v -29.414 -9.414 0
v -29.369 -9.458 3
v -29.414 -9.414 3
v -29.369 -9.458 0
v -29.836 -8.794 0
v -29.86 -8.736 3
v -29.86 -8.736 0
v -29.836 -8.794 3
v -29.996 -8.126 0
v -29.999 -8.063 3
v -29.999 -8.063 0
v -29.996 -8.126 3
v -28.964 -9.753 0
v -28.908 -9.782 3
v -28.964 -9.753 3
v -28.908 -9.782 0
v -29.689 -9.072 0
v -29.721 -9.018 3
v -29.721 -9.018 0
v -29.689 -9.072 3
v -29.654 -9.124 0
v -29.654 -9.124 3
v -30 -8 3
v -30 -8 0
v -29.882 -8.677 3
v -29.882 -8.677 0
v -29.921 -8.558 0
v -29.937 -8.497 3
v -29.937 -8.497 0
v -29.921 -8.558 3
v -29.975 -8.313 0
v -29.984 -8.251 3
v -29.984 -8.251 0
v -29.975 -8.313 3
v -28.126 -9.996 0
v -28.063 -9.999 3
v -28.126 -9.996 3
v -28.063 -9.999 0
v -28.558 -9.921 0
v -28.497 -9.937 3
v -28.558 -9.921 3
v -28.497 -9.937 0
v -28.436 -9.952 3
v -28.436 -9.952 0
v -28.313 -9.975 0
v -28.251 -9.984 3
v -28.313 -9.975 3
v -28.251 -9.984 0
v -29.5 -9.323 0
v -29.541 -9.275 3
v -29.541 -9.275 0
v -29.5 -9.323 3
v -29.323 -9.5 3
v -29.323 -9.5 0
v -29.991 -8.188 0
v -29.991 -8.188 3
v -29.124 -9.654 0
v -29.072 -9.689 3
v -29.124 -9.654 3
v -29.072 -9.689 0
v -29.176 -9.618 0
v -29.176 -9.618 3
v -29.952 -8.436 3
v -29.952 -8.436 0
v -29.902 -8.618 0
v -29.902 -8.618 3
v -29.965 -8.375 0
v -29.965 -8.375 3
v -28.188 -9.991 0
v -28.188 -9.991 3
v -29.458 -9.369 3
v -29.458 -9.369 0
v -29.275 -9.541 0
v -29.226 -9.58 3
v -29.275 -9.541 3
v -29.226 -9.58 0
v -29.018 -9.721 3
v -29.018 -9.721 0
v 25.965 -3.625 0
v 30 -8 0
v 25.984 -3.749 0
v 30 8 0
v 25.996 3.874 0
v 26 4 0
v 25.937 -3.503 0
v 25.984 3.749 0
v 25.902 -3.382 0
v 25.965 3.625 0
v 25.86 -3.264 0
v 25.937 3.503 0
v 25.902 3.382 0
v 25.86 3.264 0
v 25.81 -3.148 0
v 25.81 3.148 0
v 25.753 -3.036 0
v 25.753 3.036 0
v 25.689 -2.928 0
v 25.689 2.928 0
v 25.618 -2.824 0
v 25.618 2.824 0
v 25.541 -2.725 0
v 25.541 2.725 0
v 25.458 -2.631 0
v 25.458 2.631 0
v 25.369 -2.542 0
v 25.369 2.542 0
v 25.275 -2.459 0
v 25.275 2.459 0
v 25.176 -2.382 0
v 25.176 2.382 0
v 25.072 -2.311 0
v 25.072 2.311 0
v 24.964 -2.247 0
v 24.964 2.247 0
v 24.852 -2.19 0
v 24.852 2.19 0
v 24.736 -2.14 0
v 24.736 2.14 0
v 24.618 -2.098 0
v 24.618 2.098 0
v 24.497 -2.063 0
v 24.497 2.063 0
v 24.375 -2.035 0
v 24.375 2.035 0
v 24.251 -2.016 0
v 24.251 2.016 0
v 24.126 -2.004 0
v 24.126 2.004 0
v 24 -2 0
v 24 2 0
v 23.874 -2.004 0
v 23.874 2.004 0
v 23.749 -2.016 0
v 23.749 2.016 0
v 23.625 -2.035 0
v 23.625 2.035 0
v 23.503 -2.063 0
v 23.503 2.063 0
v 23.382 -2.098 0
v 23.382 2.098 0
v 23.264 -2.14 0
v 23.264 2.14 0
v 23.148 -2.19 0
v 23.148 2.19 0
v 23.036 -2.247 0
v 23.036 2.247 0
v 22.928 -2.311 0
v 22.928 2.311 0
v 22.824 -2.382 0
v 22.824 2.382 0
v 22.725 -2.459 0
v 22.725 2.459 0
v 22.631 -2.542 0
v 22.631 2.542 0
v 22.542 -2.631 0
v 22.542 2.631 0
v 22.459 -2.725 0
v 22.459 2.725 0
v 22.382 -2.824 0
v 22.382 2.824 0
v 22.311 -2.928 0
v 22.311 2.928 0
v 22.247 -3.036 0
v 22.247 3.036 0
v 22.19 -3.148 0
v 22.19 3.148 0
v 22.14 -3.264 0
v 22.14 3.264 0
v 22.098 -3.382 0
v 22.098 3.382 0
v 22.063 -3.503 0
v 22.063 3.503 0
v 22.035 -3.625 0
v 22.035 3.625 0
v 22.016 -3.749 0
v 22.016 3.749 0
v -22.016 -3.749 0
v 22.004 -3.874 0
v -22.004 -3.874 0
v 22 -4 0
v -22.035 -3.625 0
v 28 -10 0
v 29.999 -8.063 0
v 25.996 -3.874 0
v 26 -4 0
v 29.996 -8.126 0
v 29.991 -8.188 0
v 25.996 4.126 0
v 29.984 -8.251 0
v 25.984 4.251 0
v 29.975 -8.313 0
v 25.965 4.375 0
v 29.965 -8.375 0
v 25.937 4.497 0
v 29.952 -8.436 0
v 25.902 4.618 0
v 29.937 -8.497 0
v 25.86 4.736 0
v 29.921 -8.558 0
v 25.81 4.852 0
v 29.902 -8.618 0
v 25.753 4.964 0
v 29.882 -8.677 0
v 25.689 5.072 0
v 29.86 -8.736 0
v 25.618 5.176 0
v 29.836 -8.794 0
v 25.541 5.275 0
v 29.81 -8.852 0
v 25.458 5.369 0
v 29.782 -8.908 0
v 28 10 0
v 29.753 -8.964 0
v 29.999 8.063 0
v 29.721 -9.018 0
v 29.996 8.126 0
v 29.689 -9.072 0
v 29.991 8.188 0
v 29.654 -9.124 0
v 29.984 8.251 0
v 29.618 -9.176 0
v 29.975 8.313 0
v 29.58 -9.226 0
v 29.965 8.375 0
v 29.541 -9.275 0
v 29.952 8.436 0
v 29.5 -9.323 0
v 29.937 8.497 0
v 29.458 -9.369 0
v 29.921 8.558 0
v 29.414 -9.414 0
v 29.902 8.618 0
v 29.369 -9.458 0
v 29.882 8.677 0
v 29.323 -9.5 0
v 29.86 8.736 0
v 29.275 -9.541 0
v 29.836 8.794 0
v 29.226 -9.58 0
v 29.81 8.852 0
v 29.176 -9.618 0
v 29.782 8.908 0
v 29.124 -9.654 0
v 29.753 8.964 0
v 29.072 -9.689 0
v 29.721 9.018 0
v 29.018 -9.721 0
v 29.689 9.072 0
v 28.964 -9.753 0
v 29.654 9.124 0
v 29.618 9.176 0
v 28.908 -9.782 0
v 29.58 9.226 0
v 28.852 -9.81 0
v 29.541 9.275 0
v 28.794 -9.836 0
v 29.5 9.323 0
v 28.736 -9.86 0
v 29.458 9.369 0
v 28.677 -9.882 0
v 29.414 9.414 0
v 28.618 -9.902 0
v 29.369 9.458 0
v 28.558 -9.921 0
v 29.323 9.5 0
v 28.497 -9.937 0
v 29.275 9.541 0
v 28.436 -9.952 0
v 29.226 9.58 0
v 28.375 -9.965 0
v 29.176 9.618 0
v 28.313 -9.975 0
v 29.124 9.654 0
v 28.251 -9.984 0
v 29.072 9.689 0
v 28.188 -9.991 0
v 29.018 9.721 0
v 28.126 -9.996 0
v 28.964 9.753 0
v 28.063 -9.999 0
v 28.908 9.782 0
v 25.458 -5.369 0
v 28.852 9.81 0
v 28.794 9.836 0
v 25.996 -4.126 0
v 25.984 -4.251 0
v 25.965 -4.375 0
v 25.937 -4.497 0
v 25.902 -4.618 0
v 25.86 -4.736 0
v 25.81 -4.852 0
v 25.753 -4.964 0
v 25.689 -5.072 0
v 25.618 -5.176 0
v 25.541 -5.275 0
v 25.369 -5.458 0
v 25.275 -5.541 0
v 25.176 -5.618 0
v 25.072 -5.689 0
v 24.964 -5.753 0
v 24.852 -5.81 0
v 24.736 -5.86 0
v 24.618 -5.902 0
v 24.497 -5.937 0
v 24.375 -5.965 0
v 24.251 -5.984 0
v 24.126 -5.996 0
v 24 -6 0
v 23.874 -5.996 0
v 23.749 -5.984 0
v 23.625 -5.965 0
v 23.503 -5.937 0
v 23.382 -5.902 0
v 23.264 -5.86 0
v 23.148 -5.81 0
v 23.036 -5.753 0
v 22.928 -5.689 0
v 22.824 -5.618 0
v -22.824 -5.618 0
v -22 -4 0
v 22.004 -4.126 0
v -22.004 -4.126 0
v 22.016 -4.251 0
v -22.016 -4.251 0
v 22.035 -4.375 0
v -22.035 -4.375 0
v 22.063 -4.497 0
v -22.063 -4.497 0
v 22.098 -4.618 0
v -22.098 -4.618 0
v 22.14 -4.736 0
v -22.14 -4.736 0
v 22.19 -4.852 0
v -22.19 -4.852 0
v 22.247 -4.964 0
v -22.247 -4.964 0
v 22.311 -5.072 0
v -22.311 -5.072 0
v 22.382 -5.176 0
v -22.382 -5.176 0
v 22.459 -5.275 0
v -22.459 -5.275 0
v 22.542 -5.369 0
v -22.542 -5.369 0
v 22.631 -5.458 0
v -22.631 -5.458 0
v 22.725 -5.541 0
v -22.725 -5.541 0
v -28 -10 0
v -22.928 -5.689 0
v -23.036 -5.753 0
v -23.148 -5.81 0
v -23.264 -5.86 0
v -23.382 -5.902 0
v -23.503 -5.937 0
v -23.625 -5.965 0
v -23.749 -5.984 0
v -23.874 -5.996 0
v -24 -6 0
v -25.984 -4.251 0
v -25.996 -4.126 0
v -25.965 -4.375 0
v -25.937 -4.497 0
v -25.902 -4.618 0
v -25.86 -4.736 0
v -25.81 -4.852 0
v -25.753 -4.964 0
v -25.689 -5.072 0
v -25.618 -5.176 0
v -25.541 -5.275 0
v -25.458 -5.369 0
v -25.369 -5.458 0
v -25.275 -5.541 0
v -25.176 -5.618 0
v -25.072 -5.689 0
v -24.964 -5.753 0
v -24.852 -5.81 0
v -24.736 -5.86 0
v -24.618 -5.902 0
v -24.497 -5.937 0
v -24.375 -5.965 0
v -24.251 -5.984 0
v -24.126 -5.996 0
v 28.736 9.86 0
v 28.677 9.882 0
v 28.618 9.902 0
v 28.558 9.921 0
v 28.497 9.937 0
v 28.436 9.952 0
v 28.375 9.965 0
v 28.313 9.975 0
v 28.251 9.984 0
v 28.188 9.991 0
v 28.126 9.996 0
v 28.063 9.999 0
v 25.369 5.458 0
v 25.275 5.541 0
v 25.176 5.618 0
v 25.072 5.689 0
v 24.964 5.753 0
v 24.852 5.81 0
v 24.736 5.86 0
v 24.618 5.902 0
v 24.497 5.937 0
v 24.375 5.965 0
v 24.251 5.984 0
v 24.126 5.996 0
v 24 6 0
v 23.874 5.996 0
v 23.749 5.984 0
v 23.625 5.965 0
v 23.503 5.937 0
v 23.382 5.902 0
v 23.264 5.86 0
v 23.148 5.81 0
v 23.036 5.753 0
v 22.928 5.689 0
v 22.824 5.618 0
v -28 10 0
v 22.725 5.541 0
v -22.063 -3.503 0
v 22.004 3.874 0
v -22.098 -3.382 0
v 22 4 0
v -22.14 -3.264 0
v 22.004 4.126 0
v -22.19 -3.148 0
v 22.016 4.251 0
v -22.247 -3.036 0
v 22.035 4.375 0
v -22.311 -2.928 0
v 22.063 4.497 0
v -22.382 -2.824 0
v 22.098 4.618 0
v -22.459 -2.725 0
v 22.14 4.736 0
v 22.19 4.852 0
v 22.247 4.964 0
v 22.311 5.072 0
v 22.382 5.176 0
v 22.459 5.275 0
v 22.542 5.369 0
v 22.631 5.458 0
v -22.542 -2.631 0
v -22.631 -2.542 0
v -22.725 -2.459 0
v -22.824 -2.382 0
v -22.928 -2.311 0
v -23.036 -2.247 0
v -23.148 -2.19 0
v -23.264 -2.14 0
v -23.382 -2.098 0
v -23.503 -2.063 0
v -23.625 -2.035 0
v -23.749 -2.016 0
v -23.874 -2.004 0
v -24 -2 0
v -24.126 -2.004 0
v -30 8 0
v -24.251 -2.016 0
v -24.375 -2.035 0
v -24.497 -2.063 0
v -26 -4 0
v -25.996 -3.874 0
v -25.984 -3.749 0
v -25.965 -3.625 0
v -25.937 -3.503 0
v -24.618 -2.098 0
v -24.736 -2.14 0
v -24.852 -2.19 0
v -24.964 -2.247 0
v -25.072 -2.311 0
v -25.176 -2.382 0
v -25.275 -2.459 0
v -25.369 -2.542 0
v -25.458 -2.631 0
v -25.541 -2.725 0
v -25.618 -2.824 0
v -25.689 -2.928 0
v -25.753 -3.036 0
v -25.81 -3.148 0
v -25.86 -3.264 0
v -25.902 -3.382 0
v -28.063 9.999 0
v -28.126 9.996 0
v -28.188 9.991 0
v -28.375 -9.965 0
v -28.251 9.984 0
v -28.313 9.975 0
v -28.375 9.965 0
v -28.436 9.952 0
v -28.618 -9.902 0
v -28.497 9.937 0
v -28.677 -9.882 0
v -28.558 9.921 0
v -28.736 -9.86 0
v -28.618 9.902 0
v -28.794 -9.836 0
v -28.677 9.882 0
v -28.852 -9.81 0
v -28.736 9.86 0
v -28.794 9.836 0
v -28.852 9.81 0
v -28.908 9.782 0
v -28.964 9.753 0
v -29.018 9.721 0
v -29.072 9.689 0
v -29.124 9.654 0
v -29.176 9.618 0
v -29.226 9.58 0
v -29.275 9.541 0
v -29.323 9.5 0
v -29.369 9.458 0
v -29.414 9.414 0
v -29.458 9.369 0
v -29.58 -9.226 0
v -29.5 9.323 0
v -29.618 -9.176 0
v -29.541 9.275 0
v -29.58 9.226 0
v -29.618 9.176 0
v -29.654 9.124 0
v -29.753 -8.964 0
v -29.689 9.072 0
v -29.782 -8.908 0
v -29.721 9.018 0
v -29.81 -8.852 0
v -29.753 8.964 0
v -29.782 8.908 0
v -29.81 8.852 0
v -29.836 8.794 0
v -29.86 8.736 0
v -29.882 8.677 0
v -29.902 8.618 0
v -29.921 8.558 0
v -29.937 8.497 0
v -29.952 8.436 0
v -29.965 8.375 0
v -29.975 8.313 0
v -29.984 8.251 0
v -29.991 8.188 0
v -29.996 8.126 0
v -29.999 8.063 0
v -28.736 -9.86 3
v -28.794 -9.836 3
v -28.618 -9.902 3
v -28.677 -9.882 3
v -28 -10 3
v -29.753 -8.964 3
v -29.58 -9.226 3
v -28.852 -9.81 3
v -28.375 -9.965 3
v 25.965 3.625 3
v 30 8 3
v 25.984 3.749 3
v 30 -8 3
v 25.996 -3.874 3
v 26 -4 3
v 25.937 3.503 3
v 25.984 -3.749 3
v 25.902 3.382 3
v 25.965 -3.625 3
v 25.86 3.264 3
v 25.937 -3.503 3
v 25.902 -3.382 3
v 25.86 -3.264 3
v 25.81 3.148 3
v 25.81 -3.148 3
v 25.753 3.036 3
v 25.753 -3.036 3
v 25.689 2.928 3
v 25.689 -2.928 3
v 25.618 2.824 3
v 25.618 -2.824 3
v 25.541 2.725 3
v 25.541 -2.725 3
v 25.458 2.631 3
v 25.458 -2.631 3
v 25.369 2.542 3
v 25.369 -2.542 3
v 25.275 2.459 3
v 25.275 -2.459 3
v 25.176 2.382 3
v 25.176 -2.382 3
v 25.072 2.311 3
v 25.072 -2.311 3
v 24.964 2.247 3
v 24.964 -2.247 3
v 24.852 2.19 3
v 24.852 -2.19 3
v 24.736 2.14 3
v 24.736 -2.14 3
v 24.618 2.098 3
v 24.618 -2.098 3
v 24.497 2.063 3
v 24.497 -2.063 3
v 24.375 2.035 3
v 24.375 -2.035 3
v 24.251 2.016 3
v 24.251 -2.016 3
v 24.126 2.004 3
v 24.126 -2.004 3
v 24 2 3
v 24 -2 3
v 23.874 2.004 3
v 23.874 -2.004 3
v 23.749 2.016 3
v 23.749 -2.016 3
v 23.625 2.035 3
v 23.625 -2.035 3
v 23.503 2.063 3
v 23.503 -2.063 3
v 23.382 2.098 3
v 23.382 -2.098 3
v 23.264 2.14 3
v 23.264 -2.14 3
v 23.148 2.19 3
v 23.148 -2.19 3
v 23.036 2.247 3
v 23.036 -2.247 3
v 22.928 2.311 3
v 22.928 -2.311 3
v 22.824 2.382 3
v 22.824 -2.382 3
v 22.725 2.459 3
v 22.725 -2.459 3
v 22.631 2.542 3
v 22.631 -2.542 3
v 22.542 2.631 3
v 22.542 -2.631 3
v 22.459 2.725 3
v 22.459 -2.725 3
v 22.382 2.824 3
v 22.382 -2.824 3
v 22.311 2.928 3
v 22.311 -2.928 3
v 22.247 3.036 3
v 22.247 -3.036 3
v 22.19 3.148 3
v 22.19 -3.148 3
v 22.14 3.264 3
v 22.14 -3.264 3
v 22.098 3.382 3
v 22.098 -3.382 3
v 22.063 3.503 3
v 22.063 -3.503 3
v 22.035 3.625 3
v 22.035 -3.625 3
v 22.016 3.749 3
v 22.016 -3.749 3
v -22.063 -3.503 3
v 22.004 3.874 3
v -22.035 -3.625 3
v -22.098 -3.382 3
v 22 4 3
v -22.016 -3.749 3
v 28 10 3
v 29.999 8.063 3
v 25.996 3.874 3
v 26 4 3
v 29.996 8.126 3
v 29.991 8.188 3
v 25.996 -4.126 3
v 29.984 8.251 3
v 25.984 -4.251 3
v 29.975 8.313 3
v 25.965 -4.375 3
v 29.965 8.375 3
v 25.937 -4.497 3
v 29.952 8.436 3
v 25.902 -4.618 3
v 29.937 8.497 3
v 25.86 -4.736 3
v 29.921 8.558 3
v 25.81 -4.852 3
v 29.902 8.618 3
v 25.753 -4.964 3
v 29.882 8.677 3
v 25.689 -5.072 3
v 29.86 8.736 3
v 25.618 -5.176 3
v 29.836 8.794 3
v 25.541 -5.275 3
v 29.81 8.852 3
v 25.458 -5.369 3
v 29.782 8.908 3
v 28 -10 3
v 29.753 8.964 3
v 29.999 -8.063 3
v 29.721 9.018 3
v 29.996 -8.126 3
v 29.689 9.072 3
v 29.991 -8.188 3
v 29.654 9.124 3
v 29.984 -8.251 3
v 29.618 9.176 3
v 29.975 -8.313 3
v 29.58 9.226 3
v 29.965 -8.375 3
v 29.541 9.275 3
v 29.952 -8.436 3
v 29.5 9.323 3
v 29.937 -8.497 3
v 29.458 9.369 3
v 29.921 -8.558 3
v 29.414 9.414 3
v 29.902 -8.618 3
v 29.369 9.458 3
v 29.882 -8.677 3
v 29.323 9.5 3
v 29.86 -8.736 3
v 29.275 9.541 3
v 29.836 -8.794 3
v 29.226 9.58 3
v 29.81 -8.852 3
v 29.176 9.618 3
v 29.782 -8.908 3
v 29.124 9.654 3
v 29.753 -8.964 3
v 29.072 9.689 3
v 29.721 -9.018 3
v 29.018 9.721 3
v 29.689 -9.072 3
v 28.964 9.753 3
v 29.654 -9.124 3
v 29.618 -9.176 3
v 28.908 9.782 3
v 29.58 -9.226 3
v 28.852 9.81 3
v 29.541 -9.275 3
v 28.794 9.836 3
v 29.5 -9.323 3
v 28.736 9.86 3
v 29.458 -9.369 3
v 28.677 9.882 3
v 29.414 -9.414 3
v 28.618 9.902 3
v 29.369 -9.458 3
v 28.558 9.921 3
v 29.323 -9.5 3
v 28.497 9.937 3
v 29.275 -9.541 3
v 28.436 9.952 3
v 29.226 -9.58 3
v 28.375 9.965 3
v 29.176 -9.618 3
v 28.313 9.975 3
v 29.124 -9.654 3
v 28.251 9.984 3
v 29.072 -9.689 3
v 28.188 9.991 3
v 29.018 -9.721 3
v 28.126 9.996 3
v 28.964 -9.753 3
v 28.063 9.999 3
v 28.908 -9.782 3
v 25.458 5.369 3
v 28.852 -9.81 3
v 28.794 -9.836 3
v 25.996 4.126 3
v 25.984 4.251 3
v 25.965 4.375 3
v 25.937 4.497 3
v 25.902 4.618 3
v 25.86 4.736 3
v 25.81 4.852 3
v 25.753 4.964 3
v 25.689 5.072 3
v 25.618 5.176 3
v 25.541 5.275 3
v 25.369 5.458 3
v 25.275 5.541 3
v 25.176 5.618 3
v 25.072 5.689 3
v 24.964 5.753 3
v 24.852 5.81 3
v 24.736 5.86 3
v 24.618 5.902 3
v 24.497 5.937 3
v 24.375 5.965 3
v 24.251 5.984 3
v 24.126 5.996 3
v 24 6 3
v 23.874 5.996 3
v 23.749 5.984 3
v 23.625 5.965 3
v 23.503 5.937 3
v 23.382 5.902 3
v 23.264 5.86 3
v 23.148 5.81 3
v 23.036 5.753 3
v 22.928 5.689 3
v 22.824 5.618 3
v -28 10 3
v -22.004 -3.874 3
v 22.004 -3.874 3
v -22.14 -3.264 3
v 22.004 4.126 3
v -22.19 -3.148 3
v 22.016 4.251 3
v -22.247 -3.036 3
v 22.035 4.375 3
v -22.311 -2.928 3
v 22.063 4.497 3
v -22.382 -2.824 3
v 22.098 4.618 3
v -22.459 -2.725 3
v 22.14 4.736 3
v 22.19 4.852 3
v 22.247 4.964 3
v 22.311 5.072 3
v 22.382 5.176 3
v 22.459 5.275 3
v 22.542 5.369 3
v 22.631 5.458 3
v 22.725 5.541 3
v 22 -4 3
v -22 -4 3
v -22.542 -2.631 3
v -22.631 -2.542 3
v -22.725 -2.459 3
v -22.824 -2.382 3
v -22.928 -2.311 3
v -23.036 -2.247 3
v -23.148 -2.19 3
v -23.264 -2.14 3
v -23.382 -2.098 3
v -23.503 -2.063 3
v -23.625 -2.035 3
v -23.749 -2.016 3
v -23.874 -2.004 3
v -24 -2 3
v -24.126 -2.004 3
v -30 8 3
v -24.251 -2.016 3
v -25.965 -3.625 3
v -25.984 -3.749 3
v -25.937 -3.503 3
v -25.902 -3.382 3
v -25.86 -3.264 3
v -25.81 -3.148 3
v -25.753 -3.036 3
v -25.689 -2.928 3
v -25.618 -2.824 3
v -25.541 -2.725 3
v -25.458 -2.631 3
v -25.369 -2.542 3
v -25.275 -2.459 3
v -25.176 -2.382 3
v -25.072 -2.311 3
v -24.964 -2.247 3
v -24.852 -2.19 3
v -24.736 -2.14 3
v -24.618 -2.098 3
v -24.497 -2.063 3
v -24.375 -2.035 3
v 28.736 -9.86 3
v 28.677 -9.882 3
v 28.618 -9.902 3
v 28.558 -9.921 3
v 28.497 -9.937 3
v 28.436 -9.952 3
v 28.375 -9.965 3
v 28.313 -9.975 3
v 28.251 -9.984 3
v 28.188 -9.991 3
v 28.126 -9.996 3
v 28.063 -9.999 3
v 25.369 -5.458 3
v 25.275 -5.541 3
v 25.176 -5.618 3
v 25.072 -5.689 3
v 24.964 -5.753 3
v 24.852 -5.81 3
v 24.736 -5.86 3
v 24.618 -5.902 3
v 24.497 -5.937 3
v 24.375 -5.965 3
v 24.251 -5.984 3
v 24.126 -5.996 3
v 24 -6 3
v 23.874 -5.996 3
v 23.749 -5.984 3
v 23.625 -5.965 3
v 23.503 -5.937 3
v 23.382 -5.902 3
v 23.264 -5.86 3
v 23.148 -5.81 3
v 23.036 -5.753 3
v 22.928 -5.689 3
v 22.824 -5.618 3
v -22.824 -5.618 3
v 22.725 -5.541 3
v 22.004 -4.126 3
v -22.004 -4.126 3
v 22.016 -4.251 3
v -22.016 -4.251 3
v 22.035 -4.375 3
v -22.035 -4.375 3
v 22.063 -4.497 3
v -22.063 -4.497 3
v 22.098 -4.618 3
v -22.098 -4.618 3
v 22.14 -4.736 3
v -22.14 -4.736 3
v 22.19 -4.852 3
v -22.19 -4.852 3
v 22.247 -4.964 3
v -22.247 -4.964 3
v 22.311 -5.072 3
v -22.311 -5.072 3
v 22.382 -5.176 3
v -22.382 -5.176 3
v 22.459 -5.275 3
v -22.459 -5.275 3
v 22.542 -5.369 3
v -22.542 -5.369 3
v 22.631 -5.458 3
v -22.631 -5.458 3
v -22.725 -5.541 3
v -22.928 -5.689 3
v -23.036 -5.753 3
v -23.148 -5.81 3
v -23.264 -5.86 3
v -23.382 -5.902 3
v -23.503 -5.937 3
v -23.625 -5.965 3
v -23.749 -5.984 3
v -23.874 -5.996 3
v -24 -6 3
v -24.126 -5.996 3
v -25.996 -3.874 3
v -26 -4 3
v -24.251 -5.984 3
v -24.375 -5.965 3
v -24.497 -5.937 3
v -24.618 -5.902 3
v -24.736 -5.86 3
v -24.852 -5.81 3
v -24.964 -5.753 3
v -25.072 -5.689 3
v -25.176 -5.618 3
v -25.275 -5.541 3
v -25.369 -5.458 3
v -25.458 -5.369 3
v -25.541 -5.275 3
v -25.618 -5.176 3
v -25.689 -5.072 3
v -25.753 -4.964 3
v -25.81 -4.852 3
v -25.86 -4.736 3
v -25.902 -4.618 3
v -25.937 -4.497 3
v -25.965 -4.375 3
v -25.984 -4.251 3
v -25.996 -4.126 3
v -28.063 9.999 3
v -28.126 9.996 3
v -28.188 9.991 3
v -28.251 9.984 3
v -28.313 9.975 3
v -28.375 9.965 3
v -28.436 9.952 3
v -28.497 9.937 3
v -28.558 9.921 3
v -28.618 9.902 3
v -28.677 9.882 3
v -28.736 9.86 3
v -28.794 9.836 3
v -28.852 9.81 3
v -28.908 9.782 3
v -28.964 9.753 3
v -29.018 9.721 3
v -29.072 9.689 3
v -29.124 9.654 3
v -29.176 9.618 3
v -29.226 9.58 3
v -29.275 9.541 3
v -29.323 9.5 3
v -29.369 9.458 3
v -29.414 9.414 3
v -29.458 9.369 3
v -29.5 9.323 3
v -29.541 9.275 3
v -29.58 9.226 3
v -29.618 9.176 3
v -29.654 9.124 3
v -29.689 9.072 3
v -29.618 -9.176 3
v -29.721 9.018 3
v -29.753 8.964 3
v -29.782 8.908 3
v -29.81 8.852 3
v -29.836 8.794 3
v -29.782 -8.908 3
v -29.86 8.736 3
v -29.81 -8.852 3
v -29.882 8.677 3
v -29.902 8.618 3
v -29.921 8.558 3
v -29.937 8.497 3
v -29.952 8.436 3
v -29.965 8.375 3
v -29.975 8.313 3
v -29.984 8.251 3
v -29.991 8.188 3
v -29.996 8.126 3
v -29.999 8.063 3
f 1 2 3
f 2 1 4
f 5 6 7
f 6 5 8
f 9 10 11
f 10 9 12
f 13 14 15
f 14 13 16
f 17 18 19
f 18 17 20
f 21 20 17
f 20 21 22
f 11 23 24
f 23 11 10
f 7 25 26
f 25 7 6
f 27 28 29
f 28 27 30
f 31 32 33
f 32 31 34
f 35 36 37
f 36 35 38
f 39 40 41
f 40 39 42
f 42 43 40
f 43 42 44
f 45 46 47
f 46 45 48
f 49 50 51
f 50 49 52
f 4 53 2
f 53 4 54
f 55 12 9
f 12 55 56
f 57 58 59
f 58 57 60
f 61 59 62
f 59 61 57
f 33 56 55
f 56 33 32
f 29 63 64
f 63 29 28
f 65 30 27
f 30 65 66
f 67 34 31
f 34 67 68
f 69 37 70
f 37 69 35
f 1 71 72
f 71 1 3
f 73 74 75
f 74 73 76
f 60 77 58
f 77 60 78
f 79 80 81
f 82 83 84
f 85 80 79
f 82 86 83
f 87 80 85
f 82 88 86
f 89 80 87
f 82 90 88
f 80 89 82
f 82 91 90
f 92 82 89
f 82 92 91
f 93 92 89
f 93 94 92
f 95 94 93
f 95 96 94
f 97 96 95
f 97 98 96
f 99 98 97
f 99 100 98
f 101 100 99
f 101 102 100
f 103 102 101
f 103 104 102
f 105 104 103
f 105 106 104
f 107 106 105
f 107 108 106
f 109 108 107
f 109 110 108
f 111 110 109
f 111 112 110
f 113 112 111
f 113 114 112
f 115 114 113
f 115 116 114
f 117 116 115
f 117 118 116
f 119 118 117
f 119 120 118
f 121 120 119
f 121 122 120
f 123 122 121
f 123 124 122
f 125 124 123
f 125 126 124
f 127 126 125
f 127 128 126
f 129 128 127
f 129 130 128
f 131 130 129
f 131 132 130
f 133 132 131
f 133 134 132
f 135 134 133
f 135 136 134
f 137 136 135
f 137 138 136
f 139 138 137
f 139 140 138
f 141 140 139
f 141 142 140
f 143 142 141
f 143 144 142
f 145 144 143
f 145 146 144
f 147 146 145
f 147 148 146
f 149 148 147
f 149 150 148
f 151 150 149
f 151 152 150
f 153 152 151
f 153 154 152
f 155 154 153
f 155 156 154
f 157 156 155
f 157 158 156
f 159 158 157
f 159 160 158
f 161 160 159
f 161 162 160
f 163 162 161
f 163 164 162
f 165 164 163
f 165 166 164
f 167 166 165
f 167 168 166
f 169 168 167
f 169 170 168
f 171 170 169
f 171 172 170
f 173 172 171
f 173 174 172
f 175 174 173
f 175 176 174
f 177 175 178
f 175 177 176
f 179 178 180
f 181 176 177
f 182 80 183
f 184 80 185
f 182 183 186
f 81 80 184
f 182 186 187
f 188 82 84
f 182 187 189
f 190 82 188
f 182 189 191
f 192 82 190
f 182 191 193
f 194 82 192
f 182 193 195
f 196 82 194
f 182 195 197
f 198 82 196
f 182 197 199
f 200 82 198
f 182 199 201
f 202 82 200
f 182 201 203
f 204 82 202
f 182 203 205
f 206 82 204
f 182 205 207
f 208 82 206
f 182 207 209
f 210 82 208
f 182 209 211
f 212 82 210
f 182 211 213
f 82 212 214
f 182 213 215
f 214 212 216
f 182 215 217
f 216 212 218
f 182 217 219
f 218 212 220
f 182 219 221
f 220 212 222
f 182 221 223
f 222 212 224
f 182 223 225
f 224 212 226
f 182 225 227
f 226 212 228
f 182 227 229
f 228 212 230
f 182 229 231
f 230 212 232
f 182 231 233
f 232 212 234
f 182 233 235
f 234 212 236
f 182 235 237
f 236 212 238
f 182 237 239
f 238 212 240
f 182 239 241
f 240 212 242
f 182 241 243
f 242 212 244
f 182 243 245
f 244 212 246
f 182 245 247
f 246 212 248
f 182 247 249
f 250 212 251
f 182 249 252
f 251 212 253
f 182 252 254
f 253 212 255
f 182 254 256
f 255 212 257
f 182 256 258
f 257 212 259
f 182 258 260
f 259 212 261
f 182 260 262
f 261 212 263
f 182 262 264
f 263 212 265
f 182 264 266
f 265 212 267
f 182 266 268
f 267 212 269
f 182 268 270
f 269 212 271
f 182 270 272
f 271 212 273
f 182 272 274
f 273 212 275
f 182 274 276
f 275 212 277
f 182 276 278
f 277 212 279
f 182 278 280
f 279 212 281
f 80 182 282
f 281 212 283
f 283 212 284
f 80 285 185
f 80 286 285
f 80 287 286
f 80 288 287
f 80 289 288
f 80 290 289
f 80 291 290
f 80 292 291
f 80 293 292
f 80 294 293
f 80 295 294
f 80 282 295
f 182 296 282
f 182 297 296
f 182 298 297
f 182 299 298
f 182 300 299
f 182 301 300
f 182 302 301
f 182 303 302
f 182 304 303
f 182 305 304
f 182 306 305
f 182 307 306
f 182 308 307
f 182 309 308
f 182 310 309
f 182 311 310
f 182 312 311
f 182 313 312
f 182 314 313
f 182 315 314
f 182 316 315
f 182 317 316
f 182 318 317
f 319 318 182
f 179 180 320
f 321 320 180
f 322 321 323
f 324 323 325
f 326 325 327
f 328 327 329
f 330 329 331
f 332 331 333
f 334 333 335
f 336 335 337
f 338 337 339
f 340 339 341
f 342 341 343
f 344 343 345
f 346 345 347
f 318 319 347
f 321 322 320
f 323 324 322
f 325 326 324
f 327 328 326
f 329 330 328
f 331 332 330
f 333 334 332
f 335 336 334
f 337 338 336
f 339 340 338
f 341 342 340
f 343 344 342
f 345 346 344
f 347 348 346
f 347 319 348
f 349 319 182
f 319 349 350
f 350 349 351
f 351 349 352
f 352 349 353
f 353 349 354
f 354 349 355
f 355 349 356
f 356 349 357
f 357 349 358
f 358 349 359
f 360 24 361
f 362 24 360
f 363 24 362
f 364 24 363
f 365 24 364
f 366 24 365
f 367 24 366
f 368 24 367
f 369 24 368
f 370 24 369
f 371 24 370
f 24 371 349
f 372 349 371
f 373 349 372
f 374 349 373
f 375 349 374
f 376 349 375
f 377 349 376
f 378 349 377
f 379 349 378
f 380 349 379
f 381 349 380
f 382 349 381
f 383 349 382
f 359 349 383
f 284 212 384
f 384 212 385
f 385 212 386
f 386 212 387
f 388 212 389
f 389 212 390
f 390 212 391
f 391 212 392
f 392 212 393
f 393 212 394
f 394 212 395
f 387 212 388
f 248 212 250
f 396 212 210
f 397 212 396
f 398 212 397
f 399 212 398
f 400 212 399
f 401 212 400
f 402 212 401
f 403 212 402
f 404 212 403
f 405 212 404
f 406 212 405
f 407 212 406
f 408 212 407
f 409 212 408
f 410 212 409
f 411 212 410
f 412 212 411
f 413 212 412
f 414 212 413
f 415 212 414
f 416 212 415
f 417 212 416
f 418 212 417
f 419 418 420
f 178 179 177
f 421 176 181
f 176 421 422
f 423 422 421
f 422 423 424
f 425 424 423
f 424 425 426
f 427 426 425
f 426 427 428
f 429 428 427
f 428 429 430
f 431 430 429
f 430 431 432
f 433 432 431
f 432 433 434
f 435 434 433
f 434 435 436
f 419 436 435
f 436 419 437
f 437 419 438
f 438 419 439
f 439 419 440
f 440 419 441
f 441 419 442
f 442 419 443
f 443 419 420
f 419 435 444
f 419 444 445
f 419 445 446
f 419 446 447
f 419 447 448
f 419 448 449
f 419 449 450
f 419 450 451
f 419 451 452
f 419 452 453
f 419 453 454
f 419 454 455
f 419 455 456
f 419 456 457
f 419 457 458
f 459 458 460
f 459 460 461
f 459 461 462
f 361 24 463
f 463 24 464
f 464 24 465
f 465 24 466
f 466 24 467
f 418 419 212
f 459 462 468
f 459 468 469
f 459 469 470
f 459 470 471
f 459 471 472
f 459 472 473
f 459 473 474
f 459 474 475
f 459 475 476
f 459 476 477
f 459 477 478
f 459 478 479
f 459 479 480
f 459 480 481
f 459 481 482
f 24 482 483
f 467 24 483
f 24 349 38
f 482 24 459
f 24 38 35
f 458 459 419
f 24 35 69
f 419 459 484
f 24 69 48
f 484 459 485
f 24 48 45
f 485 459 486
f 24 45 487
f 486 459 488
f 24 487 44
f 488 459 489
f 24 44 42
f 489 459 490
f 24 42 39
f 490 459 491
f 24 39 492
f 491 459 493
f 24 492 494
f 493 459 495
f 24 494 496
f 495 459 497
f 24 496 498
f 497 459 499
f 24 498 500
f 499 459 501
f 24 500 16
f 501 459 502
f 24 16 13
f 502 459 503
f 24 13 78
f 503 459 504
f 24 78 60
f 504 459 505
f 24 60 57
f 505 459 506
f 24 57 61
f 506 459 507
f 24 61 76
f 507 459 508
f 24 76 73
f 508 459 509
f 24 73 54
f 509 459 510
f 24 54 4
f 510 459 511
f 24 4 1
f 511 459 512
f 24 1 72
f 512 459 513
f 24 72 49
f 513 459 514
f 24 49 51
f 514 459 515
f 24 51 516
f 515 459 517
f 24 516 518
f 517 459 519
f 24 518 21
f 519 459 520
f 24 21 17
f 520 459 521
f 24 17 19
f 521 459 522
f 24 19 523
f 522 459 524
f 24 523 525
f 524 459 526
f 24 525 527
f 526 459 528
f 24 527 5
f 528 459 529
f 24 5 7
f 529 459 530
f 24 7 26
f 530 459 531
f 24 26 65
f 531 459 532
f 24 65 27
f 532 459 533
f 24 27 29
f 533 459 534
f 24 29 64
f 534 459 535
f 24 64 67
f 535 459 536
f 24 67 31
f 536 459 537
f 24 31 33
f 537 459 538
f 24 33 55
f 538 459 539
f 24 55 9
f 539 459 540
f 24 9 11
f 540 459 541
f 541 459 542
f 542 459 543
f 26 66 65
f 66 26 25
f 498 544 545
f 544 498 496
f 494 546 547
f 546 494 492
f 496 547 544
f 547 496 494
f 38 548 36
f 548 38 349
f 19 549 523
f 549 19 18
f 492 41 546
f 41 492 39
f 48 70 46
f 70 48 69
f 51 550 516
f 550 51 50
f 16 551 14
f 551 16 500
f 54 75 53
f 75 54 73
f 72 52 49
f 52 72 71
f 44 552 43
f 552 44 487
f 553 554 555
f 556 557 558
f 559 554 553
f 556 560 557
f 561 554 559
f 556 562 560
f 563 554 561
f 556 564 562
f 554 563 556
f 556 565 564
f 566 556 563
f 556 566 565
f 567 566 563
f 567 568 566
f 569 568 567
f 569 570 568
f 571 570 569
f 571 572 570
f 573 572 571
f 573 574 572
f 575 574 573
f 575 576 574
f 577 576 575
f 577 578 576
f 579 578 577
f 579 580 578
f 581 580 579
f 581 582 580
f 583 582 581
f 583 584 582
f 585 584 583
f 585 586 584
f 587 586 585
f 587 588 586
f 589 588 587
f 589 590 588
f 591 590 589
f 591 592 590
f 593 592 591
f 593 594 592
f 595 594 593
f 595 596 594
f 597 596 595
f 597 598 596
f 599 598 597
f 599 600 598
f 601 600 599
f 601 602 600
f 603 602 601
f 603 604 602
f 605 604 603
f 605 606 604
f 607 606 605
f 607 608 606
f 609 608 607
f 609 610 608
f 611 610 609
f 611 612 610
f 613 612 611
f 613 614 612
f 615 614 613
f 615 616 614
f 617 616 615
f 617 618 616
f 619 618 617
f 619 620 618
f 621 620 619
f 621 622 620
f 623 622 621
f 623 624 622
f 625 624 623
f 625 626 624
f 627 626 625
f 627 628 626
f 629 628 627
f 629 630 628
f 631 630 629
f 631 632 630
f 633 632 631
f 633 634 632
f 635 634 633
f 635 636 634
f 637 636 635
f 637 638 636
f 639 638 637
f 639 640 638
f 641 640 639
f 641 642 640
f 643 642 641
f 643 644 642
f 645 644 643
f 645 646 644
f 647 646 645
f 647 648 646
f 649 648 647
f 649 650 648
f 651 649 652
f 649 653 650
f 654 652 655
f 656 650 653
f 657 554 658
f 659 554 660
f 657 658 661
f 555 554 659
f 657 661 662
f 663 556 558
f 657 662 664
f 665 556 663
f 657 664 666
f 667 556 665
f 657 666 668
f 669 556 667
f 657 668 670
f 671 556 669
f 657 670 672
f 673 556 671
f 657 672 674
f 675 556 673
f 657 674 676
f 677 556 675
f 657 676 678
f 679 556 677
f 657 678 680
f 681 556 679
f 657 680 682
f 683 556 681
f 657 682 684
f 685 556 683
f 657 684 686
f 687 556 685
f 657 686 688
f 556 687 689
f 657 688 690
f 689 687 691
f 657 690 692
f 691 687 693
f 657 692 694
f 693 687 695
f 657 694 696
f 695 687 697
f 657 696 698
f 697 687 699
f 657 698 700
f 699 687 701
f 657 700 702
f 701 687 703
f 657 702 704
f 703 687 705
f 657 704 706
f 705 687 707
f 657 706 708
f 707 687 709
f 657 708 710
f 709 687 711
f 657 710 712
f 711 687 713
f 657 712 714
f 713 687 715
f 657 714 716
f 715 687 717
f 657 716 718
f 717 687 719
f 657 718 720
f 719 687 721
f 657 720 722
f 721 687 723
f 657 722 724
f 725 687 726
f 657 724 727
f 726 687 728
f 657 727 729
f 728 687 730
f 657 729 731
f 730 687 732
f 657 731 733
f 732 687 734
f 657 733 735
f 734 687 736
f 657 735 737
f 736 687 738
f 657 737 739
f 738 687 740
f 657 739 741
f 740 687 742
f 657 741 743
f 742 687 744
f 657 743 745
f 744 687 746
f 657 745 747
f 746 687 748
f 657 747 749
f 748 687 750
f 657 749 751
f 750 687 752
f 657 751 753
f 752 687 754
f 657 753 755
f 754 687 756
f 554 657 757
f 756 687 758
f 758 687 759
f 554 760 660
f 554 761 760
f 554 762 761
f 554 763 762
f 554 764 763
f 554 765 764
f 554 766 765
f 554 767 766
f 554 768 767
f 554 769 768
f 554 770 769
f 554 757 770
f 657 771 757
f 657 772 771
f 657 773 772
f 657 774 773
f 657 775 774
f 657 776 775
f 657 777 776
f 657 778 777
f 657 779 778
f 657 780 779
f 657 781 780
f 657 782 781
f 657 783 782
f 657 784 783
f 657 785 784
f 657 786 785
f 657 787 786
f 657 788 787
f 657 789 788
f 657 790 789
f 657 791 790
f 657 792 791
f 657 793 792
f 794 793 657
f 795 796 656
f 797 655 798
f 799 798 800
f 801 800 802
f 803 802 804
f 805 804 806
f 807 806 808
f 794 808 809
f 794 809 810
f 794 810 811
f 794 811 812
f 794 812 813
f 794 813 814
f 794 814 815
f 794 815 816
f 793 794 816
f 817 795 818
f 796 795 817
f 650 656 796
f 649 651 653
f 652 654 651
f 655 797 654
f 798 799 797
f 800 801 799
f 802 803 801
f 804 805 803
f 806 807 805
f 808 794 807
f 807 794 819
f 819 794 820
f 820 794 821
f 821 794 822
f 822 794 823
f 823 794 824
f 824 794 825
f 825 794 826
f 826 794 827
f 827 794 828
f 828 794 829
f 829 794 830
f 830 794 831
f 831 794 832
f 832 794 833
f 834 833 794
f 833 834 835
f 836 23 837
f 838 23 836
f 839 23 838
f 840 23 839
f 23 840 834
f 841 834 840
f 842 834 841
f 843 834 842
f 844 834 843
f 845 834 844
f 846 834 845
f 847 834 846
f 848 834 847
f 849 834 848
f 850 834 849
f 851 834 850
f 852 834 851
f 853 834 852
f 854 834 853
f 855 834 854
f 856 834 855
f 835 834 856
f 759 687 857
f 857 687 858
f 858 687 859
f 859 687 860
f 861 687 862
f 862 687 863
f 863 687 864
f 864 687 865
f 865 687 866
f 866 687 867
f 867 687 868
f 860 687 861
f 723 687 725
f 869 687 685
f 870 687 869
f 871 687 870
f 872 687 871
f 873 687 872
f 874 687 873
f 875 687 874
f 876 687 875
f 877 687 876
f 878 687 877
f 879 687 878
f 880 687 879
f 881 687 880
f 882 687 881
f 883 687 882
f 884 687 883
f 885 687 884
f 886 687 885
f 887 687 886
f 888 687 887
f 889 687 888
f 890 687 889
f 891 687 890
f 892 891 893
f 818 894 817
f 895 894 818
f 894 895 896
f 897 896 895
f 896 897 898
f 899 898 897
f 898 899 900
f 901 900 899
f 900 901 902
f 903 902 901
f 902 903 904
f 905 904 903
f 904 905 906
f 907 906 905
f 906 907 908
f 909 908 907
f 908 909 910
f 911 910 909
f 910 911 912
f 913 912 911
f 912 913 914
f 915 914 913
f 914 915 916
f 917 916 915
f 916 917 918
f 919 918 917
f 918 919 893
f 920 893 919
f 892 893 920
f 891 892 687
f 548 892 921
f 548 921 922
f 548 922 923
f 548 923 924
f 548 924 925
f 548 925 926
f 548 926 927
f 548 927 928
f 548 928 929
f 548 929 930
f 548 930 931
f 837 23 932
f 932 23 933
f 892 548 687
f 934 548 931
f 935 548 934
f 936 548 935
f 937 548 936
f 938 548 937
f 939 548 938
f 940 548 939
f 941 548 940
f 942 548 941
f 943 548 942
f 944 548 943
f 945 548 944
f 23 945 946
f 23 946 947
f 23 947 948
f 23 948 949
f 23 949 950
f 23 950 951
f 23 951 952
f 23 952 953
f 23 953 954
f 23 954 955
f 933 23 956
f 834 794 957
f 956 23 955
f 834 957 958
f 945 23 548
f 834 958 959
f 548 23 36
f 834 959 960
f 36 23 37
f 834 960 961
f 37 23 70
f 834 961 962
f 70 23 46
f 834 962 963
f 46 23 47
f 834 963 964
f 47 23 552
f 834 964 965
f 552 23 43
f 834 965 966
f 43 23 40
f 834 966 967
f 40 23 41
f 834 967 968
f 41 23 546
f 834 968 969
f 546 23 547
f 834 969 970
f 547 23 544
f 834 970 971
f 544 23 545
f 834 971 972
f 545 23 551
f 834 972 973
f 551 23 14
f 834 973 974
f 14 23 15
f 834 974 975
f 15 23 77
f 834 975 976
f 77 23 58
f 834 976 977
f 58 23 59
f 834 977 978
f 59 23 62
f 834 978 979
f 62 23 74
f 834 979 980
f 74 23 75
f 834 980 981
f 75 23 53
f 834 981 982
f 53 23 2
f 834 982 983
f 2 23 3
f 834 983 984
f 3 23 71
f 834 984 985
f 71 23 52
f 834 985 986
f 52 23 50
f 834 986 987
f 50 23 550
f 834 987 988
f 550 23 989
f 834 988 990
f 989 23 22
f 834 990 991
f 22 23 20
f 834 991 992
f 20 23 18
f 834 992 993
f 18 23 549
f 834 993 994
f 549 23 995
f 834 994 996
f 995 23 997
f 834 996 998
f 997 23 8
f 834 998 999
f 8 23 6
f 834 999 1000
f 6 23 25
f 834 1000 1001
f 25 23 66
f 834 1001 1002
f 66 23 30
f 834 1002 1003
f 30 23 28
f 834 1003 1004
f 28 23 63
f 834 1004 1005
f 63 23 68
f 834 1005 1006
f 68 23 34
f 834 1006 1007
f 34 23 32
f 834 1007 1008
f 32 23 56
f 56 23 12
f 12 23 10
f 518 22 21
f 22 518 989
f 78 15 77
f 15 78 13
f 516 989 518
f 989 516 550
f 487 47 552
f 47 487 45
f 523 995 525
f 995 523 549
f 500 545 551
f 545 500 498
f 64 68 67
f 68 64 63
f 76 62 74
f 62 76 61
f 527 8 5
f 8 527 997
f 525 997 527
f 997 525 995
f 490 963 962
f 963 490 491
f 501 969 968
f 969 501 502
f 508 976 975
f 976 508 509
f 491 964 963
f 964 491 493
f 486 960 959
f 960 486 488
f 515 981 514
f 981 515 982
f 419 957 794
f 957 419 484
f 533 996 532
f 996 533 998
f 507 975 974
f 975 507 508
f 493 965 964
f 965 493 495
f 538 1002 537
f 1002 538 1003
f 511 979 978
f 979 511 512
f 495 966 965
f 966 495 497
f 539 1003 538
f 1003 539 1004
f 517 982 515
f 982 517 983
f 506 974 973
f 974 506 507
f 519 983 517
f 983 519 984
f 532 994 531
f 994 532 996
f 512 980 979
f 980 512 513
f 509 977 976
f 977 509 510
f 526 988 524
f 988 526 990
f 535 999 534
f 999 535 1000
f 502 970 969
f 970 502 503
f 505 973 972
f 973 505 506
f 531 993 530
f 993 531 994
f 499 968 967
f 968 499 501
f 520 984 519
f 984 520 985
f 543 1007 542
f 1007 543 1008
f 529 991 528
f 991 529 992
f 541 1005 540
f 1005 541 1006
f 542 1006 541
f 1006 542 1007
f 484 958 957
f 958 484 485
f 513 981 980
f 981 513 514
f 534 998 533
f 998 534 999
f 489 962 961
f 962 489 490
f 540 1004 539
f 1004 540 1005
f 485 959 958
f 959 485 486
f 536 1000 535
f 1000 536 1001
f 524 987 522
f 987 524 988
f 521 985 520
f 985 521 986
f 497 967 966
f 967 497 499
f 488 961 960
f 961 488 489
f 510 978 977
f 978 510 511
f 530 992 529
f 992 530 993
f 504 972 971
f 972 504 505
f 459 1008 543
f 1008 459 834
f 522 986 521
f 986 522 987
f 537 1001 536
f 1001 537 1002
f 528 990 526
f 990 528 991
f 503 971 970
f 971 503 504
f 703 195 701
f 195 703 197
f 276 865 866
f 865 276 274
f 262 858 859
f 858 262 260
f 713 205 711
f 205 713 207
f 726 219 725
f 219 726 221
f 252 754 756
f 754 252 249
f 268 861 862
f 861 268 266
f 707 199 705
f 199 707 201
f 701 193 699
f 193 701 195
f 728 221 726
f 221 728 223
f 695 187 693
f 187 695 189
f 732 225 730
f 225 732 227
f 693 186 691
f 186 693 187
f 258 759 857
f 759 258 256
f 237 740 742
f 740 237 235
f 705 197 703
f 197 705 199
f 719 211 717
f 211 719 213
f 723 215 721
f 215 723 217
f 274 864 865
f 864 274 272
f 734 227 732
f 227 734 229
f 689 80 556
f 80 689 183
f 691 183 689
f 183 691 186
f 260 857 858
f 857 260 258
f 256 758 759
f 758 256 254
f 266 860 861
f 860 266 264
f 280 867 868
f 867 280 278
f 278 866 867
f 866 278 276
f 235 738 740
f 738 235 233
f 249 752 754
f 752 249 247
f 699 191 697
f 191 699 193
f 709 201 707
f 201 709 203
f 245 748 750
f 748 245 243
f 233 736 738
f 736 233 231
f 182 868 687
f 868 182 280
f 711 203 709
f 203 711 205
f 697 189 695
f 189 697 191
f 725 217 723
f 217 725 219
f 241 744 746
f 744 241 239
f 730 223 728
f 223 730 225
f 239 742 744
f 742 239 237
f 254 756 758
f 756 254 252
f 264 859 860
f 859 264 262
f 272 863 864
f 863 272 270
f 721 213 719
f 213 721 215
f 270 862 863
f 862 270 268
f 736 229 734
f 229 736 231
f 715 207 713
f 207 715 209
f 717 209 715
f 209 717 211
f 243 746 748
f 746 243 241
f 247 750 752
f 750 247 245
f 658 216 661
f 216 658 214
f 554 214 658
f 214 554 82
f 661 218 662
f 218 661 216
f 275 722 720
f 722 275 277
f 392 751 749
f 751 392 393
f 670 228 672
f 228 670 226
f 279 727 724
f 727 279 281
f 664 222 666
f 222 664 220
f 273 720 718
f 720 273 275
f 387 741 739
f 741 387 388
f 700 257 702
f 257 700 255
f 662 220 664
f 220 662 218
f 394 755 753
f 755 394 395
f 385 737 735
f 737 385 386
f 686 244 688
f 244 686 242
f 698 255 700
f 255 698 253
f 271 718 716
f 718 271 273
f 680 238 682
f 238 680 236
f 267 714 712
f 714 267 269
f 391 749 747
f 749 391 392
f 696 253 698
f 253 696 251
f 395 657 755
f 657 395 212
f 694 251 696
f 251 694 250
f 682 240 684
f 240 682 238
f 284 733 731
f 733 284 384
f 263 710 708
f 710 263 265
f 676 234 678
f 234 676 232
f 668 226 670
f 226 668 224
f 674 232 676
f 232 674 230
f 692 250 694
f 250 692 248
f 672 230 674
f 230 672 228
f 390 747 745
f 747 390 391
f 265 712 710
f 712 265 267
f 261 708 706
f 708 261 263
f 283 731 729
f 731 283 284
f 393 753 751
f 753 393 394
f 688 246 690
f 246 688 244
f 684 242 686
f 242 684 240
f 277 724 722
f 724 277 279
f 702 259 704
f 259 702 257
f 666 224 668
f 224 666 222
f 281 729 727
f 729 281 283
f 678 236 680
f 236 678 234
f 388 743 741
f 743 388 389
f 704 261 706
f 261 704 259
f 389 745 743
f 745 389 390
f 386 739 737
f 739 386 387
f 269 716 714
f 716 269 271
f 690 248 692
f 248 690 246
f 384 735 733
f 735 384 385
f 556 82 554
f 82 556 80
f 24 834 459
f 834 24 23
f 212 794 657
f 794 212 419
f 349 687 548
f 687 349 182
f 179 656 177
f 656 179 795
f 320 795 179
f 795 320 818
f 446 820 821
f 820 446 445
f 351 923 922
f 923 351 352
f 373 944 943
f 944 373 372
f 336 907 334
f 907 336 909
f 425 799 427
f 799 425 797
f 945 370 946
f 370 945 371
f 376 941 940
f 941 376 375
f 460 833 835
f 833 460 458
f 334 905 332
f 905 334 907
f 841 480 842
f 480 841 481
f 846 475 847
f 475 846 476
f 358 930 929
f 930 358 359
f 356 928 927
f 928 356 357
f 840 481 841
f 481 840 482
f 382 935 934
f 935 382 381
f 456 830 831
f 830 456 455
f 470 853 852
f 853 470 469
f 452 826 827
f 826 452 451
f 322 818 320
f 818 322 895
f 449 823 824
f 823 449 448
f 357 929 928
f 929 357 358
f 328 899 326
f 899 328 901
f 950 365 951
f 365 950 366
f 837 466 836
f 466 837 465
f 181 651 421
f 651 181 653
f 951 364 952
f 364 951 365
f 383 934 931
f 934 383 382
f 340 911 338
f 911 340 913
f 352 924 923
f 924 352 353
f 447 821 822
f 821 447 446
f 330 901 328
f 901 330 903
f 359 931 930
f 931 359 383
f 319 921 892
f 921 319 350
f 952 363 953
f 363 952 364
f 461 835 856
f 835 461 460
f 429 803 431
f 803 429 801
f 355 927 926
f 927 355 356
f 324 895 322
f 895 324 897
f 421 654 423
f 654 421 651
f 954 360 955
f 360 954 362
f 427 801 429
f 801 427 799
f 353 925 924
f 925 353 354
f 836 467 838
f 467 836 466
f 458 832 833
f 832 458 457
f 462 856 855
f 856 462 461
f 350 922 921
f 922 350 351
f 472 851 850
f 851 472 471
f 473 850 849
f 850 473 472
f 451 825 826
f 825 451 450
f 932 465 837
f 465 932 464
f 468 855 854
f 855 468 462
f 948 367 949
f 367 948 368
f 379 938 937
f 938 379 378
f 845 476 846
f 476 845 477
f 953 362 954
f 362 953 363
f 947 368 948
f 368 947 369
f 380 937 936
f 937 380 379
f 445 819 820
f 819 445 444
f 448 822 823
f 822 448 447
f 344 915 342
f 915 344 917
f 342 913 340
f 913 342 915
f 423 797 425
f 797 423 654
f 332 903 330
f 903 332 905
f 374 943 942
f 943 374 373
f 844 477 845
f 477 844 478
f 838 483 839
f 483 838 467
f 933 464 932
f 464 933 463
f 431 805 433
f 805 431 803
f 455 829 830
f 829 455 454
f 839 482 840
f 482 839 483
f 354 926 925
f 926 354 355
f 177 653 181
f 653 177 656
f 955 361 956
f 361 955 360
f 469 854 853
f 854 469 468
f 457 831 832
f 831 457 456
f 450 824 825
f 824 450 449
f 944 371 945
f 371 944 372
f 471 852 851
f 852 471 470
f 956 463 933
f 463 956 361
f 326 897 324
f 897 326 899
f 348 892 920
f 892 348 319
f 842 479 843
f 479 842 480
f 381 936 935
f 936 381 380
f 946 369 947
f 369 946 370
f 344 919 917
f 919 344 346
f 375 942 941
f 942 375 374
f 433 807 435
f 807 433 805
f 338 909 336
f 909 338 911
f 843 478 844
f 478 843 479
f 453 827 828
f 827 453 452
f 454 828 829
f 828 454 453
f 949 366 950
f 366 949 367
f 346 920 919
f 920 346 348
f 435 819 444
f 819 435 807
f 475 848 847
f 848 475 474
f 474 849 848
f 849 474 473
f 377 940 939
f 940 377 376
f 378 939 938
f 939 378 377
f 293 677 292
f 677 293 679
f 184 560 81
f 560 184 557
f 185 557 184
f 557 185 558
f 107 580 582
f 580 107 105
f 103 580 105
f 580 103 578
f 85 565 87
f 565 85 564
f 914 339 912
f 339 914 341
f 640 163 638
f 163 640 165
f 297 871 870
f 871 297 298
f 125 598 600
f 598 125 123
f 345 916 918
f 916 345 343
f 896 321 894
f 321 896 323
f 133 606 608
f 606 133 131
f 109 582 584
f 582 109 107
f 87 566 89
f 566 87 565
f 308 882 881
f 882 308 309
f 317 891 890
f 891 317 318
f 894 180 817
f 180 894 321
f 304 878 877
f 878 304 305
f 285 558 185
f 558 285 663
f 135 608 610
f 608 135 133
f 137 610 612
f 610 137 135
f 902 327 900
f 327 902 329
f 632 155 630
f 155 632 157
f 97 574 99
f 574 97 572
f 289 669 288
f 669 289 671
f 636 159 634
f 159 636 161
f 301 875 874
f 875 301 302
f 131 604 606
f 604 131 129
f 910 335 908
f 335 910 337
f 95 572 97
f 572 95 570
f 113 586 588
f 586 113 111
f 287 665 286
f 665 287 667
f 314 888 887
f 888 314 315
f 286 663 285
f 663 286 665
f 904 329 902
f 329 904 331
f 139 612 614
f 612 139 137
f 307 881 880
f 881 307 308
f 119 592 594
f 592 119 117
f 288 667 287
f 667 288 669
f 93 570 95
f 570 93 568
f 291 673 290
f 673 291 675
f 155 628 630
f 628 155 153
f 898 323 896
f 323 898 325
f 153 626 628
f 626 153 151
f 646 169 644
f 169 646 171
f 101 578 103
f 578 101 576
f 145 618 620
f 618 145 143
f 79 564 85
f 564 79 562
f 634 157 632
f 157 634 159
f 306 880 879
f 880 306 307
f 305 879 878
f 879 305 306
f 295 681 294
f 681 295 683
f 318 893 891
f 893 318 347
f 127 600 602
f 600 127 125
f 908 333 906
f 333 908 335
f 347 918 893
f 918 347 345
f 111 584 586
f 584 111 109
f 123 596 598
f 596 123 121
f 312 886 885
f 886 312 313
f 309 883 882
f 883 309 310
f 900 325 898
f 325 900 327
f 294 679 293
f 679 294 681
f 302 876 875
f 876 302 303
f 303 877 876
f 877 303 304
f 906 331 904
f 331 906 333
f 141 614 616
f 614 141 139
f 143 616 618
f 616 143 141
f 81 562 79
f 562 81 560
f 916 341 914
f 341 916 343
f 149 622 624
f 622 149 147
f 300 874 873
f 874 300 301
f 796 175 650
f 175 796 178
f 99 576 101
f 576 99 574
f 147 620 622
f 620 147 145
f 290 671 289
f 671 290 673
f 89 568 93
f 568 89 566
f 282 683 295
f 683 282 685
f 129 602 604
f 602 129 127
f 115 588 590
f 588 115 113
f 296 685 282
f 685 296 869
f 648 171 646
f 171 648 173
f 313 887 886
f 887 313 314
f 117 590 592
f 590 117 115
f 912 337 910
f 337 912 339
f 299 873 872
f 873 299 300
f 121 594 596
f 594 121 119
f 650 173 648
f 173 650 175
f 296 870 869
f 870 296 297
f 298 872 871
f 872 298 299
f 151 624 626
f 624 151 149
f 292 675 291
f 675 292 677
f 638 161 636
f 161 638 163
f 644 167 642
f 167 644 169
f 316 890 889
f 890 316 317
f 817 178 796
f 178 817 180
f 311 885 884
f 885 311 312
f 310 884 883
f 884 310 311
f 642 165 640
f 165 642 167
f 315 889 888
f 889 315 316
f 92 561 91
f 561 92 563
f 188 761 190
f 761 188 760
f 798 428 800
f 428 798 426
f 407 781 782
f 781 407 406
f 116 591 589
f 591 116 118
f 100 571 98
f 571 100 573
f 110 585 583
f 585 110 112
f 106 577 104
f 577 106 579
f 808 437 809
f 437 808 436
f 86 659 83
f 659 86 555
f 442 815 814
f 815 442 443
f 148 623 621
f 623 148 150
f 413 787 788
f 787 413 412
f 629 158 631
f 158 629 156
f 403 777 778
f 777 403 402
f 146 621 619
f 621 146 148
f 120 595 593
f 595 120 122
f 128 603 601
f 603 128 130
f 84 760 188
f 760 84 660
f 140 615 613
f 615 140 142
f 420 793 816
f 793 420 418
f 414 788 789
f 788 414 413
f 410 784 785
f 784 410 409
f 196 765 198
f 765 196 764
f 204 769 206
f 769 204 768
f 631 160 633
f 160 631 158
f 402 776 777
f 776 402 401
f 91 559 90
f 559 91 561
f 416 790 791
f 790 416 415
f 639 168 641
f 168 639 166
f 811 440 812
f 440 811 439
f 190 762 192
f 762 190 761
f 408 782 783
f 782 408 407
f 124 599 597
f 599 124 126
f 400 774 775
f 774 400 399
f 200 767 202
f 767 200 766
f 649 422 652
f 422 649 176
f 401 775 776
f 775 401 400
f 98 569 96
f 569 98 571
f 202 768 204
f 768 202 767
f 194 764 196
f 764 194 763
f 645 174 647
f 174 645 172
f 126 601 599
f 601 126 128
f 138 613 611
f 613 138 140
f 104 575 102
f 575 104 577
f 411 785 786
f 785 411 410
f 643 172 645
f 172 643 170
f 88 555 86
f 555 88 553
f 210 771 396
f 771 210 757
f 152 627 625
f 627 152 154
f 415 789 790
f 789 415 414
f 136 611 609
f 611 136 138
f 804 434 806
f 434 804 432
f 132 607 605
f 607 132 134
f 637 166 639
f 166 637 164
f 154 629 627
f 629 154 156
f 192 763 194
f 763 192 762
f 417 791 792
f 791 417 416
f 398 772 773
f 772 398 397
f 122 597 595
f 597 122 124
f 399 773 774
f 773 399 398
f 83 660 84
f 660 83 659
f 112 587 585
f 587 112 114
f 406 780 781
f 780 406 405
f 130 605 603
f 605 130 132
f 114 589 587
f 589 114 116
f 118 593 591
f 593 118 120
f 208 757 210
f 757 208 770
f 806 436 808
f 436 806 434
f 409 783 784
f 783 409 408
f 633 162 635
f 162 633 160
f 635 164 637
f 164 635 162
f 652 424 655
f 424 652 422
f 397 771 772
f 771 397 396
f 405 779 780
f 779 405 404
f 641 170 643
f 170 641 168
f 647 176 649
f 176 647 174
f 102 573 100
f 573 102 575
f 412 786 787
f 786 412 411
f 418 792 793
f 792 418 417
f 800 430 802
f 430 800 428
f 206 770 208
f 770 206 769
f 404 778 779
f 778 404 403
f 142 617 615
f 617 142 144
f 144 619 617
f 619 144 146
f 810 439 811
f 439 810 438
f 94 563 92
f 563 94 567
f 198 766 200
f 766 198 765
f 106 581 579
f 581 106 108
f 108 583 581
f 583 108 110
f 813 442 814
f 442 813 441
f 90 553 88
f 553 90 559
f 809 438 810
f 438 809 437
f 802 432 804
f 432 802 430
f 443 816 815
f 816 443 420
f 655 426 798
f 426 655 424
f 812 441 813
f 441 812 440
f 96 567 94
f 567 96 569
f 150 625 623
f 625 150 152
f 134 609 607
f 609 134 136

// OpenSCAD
// file: ../sc.scad
// ShortCuts.scad 
// Autor: Rudolf Huttary, Berlin 2015
//
$fn = 100; 

//show_examples(); 

module show_examples()
	place_in_rect(30, 30)
	{
		Cy(h = 10); 
		CyH(h = 10); 
		CyH(h = 10, w = 30); 
		CyS(h = 10); 
		CyS(h = 10, w1 = 25, w2 = 75); 
		Cu(10); 
		Ri(h = 10); 
		RiH(h = 10); 
		RiS(h = 10, w1 = 10); 
		RiS(h = 10, w1 = 30, w2 = 300); 
		Sp(); 
		SpH(10, 30, 30); 
	}


module help()
{
echo("==============="); 
echo("help(): shows this help"); 
echo("show_examples(): shows some examples"); 
echo("place_in_rect(): places children objects in grid"); 
echo("Transformations:"); 
echo(" transform :  T(x=0, y=0, z=0), Tx(x=0) , Ty(y=0), Tz(z=0)"); 
echo(" rotate :  R(x=0, y=0, z=0), Rx(x=0) , Ry(y=0), Rz(z=0)"); 
echo(" scale :  S(x=1, y=1, z=1), Sx(x=1) , Sy(y=1), Sz(z=1)"); 
echo("Logical"); 
echo(" difference :  D()"); 
echo(" union :  U()"); 
echo(" intersection : *missing*"); 
echo("Primitives"); 
echo(" circle :  Ci(r=10)"); 
echo(" circle_half :  CiH(r=10, w=0)")
echo(" circle_segment :  CiS(r=10, w1=0, w2=90)")
echo(" square :  Sq(x=10, y=0, center=true))"); 
echo(" cylinder :  Cy(r=10, h=1, center=true)"); 
echo(" cylinder_half :  CyH(r=10, w=0)")
echo(" cylinder_segment: CyS(r=10, h=1, w1=0, w2=90,center=true)"); 
echo(" cylinder_segment: Pie(r=10, h=1, w1=0, w2=90,center=true)"); 
echo(" cube :  Cu(x=10, y=0, z=10, center=true)"); 
echo(" ring :  Ri(R=10, r=5, h=1, center=true)"); 
echo(" ring_half :  RiH(R=10, r=5, h=1, w=0 center=true)"); 
echo(" ring_segment :  RiS(R=10, r=5, h=1, w1=0, w2=90, center=true)"); 
echo(" sphere:  Sp(r=10))"); 
echo(" sphere_half:  SpH(r=10, w1 = 0, w2 = 0))"); 
echo("==============="); 
}

// Euclidean Transformations
module T(x=0, y=0, z=0){translate([x, y, z])children(); }
module Tx(x) { translate([x, 0, 0])children(); }
module Ty(y) { translate([0, y, 0])children(); }
module Tz(z) { translate([0, 0, z])children(); }

module R(x=0, y=0, z=0){rotate([x, y, z]) children();}
module Rx(x=90){rotate([x, 0, 0]) children();}
module Ry(y=90){rotate([0, y, 0]) children();}
module Rz(z=90){rotate([0, 0, z]) children();}

module M(x=0, y=0, z=0){mirror([x, y, z]) children();}
module Mx(x=1){mirror([x, 0, 0]) children();}
module My(y=1){mirror([0, y, 0]) children();}
module Mz(z=1){mirror([0, 0, z]) children();}

module S(x=1, y=1, z=1){scale([x, y, z]) children();}
module Sx(x=1){scale([x, 1, 1]) children();}
module Sy(y=1){scale([1, y, 1]) children();}
module Sz(z=1){scale([1, 1, z]) children();}

module D() difference(){children(0); children([1:$children-1]);}
module U() children([0:$children-1]);
// module I() intersection()children([0:$children-1]); // does not work for some reason


// primitives - 2D

module Sq(x =10, y = 0, center = false)
{
   if(y==0)
		square([x, x], center = center); 
	else
		square([x, y], center = center); 
}
module Ci(r = 10)
{
	circle(r = r); 
}

// derived primitives - 2d
module CiH(r = 10, w = 0)
  circle_half(r, w); 

module CiS(r = 10, w1 = 0, w2 = 90)
  circle_segment(r, w1, w2); 


// primitives - 3d
module Cy(r = 10, h = 1, center = false)
{
	cylinder(r = r, h = h, center = center); 
}
module Cu(x = 10, y = 0, z = 10, center = false)
{
  if (y==0)
	cube([x, x, x], center = center); 
  else
	cube([x, y, z], center = center); 
}

// derived primitives - 3d
module CyH(r = 10, h = 1, w = 0, center = false)
  cylinder_half(r, h, w, center); 

module CyS(r = 10, h = 1, w1 = 0, w2 = 90, center = false)
  cylinder_segment(r, h, w1, w2, center); 

module Ri(R = 10, r = 5, h = 1, center = false)
  ring(R, r, h, center); 

module RiS(R = 10, r = 5, h = 1, w1 = 0, w2 = 90, center = false)
   ring_segment(R, r, h, w1, w2, center); 

module RiH(r1 = 10, r2, h = 1, w = 0, center = false)
   ring_half(r1, r2, h, w, center); 
module Pie(r = 10, h = 1, w1 = 0, w2 = 90, center = false)
  cylinder_segment(r, h, w1, w2, center);  
module Sp(r = 10)
  sphere(r); 
module SpH(r = 10, w1 = 0, w2 = 0)
  sphere_half(r, w1, w2); 
module SpS(r = 10, w1 = 0, w2 = 90, w3 = 90)
  sphere_segment(r, w1, w2); 




// clear text definitions
module circle_half(r = 10, w = 0)
{
	difference()
	{
		circle(r); 
     rotate([0, 0, w-90])
     translate([0, -r])
		square([r, 2*r], center = false); 
	}
}

module circle_segment(r = 10, w1 = 0, w2 = 90)
{
  W2 = (w1>w2)?w2+360:w2; 
  if (W2-w1 < 180)
    intersection()
		{
       circle_half(r, w1); 
       circle_half(r, W2-180); 
 		}
	else
    union()
		{
       circle_half(r, w1); 
       circle_half(r, W2-180); 
 		}
}

module cylinder_half(r = 10, h = 1, w = 0, center = true)
{
  linear_extrude(height = h, center = center)
  circle_half(r, w); 
} 

module cylinder_segment(r = 10, h = 1, w1 = 0, w2 = 90, center = true)
{
  linear_extrude(height = h, center = center)
  circle_segment(r, w1, w2); 
} 

module ring(R = 10, r = 5, h = 1, center = true)
{
	difference()
	{
	cylinder(r = R, h = h, center = center); 
   translate([0, 0, -2*h])
	cylinder(r = r, h = 4*h, center = false); 
	}
}

module ring_half(R = 10, r = 5, h = 1, w = 0, center = true)
{
	difference()
	{
		ring(R, r, h, center); 
     rotate([0, 0, w])
     translate([0, -R/2, 0])
		cube([2*R, R, 3*h], center = true); 
	}
}

module ring_segment(R = 10, r = 5, h = 1, w1 = 0, w2 = 90, center = true)
{
  W2 = (w1>w2)?w2+360:w2; 
  if (W2-w1 < 180)
    intersection()
		{
       ring_half(R, r, h, w1, center); 
       ring_half(R, r, h, W2-180, center); 
 		}
	else
    union()
		{
       ring_half(R, r, h, w1, center); 
       ring_half(R, r, h, W2-180, center); 
 		}
}


module sphere_half(r = 10, w1 = 0, w2 = 0)
{  
	difference()
	{
   	sphere(r); 
      rotate([-w1, -w2, 0])
     	translate([0, 0, r])
		cube([2*r, 2*r, r], center = true); 
	}

}


// additional code
module place_in_rect(dx =20, dy=20)
{
  cols = ceil(sqrt($children)); 
  rows = floor(sqrt($children)); 
  for(i = [0:$children-1])
	{ 
	  T(dx*(-cols/2+(i%cols)+.5), dy*(rows/2-floor(i/cols)-.5))
		 children(i); 
	}
}
// main file
use <../lib.scad>
$fn= 100;

fatiador= 0;
l=45;
w=40;
h=3;

/* Fatiador */
lineHeight = 0.2;
firstlayer = 0.24;
fatias = multiple(h,lineHeight)/lineHeight;
if(fatiador){
    for(i=[0:fatias]){
        if(i % 2){
            translate([-l,-w,firstlayer+i*lineHeight])
            %cube([l*2,w*2, lineHeight]);
        }
    }    
}


blob_test();


module blob_test(){
    r=2;
    x=60;
    y=20;
    d=4;
    
    difference(){
        union(){
            //top
            translate([-x/2, -y/2, 0])
            rcube(x, y,h,r);
            
        }
        
        translate([-x/2+d*1.5,-y/2+d*1.5,-.1])
        cylinder(d=d, h=h+1);
        translate([x/2-d*1.5,-y/2+d*1.5,-.1])
        cylinder(d=d, h=h+1);
        
        translate([x/2-d*1.5,y/2-d*1.5,-.1])
        cylinder(d=d, h=h+1);
    }
}    
